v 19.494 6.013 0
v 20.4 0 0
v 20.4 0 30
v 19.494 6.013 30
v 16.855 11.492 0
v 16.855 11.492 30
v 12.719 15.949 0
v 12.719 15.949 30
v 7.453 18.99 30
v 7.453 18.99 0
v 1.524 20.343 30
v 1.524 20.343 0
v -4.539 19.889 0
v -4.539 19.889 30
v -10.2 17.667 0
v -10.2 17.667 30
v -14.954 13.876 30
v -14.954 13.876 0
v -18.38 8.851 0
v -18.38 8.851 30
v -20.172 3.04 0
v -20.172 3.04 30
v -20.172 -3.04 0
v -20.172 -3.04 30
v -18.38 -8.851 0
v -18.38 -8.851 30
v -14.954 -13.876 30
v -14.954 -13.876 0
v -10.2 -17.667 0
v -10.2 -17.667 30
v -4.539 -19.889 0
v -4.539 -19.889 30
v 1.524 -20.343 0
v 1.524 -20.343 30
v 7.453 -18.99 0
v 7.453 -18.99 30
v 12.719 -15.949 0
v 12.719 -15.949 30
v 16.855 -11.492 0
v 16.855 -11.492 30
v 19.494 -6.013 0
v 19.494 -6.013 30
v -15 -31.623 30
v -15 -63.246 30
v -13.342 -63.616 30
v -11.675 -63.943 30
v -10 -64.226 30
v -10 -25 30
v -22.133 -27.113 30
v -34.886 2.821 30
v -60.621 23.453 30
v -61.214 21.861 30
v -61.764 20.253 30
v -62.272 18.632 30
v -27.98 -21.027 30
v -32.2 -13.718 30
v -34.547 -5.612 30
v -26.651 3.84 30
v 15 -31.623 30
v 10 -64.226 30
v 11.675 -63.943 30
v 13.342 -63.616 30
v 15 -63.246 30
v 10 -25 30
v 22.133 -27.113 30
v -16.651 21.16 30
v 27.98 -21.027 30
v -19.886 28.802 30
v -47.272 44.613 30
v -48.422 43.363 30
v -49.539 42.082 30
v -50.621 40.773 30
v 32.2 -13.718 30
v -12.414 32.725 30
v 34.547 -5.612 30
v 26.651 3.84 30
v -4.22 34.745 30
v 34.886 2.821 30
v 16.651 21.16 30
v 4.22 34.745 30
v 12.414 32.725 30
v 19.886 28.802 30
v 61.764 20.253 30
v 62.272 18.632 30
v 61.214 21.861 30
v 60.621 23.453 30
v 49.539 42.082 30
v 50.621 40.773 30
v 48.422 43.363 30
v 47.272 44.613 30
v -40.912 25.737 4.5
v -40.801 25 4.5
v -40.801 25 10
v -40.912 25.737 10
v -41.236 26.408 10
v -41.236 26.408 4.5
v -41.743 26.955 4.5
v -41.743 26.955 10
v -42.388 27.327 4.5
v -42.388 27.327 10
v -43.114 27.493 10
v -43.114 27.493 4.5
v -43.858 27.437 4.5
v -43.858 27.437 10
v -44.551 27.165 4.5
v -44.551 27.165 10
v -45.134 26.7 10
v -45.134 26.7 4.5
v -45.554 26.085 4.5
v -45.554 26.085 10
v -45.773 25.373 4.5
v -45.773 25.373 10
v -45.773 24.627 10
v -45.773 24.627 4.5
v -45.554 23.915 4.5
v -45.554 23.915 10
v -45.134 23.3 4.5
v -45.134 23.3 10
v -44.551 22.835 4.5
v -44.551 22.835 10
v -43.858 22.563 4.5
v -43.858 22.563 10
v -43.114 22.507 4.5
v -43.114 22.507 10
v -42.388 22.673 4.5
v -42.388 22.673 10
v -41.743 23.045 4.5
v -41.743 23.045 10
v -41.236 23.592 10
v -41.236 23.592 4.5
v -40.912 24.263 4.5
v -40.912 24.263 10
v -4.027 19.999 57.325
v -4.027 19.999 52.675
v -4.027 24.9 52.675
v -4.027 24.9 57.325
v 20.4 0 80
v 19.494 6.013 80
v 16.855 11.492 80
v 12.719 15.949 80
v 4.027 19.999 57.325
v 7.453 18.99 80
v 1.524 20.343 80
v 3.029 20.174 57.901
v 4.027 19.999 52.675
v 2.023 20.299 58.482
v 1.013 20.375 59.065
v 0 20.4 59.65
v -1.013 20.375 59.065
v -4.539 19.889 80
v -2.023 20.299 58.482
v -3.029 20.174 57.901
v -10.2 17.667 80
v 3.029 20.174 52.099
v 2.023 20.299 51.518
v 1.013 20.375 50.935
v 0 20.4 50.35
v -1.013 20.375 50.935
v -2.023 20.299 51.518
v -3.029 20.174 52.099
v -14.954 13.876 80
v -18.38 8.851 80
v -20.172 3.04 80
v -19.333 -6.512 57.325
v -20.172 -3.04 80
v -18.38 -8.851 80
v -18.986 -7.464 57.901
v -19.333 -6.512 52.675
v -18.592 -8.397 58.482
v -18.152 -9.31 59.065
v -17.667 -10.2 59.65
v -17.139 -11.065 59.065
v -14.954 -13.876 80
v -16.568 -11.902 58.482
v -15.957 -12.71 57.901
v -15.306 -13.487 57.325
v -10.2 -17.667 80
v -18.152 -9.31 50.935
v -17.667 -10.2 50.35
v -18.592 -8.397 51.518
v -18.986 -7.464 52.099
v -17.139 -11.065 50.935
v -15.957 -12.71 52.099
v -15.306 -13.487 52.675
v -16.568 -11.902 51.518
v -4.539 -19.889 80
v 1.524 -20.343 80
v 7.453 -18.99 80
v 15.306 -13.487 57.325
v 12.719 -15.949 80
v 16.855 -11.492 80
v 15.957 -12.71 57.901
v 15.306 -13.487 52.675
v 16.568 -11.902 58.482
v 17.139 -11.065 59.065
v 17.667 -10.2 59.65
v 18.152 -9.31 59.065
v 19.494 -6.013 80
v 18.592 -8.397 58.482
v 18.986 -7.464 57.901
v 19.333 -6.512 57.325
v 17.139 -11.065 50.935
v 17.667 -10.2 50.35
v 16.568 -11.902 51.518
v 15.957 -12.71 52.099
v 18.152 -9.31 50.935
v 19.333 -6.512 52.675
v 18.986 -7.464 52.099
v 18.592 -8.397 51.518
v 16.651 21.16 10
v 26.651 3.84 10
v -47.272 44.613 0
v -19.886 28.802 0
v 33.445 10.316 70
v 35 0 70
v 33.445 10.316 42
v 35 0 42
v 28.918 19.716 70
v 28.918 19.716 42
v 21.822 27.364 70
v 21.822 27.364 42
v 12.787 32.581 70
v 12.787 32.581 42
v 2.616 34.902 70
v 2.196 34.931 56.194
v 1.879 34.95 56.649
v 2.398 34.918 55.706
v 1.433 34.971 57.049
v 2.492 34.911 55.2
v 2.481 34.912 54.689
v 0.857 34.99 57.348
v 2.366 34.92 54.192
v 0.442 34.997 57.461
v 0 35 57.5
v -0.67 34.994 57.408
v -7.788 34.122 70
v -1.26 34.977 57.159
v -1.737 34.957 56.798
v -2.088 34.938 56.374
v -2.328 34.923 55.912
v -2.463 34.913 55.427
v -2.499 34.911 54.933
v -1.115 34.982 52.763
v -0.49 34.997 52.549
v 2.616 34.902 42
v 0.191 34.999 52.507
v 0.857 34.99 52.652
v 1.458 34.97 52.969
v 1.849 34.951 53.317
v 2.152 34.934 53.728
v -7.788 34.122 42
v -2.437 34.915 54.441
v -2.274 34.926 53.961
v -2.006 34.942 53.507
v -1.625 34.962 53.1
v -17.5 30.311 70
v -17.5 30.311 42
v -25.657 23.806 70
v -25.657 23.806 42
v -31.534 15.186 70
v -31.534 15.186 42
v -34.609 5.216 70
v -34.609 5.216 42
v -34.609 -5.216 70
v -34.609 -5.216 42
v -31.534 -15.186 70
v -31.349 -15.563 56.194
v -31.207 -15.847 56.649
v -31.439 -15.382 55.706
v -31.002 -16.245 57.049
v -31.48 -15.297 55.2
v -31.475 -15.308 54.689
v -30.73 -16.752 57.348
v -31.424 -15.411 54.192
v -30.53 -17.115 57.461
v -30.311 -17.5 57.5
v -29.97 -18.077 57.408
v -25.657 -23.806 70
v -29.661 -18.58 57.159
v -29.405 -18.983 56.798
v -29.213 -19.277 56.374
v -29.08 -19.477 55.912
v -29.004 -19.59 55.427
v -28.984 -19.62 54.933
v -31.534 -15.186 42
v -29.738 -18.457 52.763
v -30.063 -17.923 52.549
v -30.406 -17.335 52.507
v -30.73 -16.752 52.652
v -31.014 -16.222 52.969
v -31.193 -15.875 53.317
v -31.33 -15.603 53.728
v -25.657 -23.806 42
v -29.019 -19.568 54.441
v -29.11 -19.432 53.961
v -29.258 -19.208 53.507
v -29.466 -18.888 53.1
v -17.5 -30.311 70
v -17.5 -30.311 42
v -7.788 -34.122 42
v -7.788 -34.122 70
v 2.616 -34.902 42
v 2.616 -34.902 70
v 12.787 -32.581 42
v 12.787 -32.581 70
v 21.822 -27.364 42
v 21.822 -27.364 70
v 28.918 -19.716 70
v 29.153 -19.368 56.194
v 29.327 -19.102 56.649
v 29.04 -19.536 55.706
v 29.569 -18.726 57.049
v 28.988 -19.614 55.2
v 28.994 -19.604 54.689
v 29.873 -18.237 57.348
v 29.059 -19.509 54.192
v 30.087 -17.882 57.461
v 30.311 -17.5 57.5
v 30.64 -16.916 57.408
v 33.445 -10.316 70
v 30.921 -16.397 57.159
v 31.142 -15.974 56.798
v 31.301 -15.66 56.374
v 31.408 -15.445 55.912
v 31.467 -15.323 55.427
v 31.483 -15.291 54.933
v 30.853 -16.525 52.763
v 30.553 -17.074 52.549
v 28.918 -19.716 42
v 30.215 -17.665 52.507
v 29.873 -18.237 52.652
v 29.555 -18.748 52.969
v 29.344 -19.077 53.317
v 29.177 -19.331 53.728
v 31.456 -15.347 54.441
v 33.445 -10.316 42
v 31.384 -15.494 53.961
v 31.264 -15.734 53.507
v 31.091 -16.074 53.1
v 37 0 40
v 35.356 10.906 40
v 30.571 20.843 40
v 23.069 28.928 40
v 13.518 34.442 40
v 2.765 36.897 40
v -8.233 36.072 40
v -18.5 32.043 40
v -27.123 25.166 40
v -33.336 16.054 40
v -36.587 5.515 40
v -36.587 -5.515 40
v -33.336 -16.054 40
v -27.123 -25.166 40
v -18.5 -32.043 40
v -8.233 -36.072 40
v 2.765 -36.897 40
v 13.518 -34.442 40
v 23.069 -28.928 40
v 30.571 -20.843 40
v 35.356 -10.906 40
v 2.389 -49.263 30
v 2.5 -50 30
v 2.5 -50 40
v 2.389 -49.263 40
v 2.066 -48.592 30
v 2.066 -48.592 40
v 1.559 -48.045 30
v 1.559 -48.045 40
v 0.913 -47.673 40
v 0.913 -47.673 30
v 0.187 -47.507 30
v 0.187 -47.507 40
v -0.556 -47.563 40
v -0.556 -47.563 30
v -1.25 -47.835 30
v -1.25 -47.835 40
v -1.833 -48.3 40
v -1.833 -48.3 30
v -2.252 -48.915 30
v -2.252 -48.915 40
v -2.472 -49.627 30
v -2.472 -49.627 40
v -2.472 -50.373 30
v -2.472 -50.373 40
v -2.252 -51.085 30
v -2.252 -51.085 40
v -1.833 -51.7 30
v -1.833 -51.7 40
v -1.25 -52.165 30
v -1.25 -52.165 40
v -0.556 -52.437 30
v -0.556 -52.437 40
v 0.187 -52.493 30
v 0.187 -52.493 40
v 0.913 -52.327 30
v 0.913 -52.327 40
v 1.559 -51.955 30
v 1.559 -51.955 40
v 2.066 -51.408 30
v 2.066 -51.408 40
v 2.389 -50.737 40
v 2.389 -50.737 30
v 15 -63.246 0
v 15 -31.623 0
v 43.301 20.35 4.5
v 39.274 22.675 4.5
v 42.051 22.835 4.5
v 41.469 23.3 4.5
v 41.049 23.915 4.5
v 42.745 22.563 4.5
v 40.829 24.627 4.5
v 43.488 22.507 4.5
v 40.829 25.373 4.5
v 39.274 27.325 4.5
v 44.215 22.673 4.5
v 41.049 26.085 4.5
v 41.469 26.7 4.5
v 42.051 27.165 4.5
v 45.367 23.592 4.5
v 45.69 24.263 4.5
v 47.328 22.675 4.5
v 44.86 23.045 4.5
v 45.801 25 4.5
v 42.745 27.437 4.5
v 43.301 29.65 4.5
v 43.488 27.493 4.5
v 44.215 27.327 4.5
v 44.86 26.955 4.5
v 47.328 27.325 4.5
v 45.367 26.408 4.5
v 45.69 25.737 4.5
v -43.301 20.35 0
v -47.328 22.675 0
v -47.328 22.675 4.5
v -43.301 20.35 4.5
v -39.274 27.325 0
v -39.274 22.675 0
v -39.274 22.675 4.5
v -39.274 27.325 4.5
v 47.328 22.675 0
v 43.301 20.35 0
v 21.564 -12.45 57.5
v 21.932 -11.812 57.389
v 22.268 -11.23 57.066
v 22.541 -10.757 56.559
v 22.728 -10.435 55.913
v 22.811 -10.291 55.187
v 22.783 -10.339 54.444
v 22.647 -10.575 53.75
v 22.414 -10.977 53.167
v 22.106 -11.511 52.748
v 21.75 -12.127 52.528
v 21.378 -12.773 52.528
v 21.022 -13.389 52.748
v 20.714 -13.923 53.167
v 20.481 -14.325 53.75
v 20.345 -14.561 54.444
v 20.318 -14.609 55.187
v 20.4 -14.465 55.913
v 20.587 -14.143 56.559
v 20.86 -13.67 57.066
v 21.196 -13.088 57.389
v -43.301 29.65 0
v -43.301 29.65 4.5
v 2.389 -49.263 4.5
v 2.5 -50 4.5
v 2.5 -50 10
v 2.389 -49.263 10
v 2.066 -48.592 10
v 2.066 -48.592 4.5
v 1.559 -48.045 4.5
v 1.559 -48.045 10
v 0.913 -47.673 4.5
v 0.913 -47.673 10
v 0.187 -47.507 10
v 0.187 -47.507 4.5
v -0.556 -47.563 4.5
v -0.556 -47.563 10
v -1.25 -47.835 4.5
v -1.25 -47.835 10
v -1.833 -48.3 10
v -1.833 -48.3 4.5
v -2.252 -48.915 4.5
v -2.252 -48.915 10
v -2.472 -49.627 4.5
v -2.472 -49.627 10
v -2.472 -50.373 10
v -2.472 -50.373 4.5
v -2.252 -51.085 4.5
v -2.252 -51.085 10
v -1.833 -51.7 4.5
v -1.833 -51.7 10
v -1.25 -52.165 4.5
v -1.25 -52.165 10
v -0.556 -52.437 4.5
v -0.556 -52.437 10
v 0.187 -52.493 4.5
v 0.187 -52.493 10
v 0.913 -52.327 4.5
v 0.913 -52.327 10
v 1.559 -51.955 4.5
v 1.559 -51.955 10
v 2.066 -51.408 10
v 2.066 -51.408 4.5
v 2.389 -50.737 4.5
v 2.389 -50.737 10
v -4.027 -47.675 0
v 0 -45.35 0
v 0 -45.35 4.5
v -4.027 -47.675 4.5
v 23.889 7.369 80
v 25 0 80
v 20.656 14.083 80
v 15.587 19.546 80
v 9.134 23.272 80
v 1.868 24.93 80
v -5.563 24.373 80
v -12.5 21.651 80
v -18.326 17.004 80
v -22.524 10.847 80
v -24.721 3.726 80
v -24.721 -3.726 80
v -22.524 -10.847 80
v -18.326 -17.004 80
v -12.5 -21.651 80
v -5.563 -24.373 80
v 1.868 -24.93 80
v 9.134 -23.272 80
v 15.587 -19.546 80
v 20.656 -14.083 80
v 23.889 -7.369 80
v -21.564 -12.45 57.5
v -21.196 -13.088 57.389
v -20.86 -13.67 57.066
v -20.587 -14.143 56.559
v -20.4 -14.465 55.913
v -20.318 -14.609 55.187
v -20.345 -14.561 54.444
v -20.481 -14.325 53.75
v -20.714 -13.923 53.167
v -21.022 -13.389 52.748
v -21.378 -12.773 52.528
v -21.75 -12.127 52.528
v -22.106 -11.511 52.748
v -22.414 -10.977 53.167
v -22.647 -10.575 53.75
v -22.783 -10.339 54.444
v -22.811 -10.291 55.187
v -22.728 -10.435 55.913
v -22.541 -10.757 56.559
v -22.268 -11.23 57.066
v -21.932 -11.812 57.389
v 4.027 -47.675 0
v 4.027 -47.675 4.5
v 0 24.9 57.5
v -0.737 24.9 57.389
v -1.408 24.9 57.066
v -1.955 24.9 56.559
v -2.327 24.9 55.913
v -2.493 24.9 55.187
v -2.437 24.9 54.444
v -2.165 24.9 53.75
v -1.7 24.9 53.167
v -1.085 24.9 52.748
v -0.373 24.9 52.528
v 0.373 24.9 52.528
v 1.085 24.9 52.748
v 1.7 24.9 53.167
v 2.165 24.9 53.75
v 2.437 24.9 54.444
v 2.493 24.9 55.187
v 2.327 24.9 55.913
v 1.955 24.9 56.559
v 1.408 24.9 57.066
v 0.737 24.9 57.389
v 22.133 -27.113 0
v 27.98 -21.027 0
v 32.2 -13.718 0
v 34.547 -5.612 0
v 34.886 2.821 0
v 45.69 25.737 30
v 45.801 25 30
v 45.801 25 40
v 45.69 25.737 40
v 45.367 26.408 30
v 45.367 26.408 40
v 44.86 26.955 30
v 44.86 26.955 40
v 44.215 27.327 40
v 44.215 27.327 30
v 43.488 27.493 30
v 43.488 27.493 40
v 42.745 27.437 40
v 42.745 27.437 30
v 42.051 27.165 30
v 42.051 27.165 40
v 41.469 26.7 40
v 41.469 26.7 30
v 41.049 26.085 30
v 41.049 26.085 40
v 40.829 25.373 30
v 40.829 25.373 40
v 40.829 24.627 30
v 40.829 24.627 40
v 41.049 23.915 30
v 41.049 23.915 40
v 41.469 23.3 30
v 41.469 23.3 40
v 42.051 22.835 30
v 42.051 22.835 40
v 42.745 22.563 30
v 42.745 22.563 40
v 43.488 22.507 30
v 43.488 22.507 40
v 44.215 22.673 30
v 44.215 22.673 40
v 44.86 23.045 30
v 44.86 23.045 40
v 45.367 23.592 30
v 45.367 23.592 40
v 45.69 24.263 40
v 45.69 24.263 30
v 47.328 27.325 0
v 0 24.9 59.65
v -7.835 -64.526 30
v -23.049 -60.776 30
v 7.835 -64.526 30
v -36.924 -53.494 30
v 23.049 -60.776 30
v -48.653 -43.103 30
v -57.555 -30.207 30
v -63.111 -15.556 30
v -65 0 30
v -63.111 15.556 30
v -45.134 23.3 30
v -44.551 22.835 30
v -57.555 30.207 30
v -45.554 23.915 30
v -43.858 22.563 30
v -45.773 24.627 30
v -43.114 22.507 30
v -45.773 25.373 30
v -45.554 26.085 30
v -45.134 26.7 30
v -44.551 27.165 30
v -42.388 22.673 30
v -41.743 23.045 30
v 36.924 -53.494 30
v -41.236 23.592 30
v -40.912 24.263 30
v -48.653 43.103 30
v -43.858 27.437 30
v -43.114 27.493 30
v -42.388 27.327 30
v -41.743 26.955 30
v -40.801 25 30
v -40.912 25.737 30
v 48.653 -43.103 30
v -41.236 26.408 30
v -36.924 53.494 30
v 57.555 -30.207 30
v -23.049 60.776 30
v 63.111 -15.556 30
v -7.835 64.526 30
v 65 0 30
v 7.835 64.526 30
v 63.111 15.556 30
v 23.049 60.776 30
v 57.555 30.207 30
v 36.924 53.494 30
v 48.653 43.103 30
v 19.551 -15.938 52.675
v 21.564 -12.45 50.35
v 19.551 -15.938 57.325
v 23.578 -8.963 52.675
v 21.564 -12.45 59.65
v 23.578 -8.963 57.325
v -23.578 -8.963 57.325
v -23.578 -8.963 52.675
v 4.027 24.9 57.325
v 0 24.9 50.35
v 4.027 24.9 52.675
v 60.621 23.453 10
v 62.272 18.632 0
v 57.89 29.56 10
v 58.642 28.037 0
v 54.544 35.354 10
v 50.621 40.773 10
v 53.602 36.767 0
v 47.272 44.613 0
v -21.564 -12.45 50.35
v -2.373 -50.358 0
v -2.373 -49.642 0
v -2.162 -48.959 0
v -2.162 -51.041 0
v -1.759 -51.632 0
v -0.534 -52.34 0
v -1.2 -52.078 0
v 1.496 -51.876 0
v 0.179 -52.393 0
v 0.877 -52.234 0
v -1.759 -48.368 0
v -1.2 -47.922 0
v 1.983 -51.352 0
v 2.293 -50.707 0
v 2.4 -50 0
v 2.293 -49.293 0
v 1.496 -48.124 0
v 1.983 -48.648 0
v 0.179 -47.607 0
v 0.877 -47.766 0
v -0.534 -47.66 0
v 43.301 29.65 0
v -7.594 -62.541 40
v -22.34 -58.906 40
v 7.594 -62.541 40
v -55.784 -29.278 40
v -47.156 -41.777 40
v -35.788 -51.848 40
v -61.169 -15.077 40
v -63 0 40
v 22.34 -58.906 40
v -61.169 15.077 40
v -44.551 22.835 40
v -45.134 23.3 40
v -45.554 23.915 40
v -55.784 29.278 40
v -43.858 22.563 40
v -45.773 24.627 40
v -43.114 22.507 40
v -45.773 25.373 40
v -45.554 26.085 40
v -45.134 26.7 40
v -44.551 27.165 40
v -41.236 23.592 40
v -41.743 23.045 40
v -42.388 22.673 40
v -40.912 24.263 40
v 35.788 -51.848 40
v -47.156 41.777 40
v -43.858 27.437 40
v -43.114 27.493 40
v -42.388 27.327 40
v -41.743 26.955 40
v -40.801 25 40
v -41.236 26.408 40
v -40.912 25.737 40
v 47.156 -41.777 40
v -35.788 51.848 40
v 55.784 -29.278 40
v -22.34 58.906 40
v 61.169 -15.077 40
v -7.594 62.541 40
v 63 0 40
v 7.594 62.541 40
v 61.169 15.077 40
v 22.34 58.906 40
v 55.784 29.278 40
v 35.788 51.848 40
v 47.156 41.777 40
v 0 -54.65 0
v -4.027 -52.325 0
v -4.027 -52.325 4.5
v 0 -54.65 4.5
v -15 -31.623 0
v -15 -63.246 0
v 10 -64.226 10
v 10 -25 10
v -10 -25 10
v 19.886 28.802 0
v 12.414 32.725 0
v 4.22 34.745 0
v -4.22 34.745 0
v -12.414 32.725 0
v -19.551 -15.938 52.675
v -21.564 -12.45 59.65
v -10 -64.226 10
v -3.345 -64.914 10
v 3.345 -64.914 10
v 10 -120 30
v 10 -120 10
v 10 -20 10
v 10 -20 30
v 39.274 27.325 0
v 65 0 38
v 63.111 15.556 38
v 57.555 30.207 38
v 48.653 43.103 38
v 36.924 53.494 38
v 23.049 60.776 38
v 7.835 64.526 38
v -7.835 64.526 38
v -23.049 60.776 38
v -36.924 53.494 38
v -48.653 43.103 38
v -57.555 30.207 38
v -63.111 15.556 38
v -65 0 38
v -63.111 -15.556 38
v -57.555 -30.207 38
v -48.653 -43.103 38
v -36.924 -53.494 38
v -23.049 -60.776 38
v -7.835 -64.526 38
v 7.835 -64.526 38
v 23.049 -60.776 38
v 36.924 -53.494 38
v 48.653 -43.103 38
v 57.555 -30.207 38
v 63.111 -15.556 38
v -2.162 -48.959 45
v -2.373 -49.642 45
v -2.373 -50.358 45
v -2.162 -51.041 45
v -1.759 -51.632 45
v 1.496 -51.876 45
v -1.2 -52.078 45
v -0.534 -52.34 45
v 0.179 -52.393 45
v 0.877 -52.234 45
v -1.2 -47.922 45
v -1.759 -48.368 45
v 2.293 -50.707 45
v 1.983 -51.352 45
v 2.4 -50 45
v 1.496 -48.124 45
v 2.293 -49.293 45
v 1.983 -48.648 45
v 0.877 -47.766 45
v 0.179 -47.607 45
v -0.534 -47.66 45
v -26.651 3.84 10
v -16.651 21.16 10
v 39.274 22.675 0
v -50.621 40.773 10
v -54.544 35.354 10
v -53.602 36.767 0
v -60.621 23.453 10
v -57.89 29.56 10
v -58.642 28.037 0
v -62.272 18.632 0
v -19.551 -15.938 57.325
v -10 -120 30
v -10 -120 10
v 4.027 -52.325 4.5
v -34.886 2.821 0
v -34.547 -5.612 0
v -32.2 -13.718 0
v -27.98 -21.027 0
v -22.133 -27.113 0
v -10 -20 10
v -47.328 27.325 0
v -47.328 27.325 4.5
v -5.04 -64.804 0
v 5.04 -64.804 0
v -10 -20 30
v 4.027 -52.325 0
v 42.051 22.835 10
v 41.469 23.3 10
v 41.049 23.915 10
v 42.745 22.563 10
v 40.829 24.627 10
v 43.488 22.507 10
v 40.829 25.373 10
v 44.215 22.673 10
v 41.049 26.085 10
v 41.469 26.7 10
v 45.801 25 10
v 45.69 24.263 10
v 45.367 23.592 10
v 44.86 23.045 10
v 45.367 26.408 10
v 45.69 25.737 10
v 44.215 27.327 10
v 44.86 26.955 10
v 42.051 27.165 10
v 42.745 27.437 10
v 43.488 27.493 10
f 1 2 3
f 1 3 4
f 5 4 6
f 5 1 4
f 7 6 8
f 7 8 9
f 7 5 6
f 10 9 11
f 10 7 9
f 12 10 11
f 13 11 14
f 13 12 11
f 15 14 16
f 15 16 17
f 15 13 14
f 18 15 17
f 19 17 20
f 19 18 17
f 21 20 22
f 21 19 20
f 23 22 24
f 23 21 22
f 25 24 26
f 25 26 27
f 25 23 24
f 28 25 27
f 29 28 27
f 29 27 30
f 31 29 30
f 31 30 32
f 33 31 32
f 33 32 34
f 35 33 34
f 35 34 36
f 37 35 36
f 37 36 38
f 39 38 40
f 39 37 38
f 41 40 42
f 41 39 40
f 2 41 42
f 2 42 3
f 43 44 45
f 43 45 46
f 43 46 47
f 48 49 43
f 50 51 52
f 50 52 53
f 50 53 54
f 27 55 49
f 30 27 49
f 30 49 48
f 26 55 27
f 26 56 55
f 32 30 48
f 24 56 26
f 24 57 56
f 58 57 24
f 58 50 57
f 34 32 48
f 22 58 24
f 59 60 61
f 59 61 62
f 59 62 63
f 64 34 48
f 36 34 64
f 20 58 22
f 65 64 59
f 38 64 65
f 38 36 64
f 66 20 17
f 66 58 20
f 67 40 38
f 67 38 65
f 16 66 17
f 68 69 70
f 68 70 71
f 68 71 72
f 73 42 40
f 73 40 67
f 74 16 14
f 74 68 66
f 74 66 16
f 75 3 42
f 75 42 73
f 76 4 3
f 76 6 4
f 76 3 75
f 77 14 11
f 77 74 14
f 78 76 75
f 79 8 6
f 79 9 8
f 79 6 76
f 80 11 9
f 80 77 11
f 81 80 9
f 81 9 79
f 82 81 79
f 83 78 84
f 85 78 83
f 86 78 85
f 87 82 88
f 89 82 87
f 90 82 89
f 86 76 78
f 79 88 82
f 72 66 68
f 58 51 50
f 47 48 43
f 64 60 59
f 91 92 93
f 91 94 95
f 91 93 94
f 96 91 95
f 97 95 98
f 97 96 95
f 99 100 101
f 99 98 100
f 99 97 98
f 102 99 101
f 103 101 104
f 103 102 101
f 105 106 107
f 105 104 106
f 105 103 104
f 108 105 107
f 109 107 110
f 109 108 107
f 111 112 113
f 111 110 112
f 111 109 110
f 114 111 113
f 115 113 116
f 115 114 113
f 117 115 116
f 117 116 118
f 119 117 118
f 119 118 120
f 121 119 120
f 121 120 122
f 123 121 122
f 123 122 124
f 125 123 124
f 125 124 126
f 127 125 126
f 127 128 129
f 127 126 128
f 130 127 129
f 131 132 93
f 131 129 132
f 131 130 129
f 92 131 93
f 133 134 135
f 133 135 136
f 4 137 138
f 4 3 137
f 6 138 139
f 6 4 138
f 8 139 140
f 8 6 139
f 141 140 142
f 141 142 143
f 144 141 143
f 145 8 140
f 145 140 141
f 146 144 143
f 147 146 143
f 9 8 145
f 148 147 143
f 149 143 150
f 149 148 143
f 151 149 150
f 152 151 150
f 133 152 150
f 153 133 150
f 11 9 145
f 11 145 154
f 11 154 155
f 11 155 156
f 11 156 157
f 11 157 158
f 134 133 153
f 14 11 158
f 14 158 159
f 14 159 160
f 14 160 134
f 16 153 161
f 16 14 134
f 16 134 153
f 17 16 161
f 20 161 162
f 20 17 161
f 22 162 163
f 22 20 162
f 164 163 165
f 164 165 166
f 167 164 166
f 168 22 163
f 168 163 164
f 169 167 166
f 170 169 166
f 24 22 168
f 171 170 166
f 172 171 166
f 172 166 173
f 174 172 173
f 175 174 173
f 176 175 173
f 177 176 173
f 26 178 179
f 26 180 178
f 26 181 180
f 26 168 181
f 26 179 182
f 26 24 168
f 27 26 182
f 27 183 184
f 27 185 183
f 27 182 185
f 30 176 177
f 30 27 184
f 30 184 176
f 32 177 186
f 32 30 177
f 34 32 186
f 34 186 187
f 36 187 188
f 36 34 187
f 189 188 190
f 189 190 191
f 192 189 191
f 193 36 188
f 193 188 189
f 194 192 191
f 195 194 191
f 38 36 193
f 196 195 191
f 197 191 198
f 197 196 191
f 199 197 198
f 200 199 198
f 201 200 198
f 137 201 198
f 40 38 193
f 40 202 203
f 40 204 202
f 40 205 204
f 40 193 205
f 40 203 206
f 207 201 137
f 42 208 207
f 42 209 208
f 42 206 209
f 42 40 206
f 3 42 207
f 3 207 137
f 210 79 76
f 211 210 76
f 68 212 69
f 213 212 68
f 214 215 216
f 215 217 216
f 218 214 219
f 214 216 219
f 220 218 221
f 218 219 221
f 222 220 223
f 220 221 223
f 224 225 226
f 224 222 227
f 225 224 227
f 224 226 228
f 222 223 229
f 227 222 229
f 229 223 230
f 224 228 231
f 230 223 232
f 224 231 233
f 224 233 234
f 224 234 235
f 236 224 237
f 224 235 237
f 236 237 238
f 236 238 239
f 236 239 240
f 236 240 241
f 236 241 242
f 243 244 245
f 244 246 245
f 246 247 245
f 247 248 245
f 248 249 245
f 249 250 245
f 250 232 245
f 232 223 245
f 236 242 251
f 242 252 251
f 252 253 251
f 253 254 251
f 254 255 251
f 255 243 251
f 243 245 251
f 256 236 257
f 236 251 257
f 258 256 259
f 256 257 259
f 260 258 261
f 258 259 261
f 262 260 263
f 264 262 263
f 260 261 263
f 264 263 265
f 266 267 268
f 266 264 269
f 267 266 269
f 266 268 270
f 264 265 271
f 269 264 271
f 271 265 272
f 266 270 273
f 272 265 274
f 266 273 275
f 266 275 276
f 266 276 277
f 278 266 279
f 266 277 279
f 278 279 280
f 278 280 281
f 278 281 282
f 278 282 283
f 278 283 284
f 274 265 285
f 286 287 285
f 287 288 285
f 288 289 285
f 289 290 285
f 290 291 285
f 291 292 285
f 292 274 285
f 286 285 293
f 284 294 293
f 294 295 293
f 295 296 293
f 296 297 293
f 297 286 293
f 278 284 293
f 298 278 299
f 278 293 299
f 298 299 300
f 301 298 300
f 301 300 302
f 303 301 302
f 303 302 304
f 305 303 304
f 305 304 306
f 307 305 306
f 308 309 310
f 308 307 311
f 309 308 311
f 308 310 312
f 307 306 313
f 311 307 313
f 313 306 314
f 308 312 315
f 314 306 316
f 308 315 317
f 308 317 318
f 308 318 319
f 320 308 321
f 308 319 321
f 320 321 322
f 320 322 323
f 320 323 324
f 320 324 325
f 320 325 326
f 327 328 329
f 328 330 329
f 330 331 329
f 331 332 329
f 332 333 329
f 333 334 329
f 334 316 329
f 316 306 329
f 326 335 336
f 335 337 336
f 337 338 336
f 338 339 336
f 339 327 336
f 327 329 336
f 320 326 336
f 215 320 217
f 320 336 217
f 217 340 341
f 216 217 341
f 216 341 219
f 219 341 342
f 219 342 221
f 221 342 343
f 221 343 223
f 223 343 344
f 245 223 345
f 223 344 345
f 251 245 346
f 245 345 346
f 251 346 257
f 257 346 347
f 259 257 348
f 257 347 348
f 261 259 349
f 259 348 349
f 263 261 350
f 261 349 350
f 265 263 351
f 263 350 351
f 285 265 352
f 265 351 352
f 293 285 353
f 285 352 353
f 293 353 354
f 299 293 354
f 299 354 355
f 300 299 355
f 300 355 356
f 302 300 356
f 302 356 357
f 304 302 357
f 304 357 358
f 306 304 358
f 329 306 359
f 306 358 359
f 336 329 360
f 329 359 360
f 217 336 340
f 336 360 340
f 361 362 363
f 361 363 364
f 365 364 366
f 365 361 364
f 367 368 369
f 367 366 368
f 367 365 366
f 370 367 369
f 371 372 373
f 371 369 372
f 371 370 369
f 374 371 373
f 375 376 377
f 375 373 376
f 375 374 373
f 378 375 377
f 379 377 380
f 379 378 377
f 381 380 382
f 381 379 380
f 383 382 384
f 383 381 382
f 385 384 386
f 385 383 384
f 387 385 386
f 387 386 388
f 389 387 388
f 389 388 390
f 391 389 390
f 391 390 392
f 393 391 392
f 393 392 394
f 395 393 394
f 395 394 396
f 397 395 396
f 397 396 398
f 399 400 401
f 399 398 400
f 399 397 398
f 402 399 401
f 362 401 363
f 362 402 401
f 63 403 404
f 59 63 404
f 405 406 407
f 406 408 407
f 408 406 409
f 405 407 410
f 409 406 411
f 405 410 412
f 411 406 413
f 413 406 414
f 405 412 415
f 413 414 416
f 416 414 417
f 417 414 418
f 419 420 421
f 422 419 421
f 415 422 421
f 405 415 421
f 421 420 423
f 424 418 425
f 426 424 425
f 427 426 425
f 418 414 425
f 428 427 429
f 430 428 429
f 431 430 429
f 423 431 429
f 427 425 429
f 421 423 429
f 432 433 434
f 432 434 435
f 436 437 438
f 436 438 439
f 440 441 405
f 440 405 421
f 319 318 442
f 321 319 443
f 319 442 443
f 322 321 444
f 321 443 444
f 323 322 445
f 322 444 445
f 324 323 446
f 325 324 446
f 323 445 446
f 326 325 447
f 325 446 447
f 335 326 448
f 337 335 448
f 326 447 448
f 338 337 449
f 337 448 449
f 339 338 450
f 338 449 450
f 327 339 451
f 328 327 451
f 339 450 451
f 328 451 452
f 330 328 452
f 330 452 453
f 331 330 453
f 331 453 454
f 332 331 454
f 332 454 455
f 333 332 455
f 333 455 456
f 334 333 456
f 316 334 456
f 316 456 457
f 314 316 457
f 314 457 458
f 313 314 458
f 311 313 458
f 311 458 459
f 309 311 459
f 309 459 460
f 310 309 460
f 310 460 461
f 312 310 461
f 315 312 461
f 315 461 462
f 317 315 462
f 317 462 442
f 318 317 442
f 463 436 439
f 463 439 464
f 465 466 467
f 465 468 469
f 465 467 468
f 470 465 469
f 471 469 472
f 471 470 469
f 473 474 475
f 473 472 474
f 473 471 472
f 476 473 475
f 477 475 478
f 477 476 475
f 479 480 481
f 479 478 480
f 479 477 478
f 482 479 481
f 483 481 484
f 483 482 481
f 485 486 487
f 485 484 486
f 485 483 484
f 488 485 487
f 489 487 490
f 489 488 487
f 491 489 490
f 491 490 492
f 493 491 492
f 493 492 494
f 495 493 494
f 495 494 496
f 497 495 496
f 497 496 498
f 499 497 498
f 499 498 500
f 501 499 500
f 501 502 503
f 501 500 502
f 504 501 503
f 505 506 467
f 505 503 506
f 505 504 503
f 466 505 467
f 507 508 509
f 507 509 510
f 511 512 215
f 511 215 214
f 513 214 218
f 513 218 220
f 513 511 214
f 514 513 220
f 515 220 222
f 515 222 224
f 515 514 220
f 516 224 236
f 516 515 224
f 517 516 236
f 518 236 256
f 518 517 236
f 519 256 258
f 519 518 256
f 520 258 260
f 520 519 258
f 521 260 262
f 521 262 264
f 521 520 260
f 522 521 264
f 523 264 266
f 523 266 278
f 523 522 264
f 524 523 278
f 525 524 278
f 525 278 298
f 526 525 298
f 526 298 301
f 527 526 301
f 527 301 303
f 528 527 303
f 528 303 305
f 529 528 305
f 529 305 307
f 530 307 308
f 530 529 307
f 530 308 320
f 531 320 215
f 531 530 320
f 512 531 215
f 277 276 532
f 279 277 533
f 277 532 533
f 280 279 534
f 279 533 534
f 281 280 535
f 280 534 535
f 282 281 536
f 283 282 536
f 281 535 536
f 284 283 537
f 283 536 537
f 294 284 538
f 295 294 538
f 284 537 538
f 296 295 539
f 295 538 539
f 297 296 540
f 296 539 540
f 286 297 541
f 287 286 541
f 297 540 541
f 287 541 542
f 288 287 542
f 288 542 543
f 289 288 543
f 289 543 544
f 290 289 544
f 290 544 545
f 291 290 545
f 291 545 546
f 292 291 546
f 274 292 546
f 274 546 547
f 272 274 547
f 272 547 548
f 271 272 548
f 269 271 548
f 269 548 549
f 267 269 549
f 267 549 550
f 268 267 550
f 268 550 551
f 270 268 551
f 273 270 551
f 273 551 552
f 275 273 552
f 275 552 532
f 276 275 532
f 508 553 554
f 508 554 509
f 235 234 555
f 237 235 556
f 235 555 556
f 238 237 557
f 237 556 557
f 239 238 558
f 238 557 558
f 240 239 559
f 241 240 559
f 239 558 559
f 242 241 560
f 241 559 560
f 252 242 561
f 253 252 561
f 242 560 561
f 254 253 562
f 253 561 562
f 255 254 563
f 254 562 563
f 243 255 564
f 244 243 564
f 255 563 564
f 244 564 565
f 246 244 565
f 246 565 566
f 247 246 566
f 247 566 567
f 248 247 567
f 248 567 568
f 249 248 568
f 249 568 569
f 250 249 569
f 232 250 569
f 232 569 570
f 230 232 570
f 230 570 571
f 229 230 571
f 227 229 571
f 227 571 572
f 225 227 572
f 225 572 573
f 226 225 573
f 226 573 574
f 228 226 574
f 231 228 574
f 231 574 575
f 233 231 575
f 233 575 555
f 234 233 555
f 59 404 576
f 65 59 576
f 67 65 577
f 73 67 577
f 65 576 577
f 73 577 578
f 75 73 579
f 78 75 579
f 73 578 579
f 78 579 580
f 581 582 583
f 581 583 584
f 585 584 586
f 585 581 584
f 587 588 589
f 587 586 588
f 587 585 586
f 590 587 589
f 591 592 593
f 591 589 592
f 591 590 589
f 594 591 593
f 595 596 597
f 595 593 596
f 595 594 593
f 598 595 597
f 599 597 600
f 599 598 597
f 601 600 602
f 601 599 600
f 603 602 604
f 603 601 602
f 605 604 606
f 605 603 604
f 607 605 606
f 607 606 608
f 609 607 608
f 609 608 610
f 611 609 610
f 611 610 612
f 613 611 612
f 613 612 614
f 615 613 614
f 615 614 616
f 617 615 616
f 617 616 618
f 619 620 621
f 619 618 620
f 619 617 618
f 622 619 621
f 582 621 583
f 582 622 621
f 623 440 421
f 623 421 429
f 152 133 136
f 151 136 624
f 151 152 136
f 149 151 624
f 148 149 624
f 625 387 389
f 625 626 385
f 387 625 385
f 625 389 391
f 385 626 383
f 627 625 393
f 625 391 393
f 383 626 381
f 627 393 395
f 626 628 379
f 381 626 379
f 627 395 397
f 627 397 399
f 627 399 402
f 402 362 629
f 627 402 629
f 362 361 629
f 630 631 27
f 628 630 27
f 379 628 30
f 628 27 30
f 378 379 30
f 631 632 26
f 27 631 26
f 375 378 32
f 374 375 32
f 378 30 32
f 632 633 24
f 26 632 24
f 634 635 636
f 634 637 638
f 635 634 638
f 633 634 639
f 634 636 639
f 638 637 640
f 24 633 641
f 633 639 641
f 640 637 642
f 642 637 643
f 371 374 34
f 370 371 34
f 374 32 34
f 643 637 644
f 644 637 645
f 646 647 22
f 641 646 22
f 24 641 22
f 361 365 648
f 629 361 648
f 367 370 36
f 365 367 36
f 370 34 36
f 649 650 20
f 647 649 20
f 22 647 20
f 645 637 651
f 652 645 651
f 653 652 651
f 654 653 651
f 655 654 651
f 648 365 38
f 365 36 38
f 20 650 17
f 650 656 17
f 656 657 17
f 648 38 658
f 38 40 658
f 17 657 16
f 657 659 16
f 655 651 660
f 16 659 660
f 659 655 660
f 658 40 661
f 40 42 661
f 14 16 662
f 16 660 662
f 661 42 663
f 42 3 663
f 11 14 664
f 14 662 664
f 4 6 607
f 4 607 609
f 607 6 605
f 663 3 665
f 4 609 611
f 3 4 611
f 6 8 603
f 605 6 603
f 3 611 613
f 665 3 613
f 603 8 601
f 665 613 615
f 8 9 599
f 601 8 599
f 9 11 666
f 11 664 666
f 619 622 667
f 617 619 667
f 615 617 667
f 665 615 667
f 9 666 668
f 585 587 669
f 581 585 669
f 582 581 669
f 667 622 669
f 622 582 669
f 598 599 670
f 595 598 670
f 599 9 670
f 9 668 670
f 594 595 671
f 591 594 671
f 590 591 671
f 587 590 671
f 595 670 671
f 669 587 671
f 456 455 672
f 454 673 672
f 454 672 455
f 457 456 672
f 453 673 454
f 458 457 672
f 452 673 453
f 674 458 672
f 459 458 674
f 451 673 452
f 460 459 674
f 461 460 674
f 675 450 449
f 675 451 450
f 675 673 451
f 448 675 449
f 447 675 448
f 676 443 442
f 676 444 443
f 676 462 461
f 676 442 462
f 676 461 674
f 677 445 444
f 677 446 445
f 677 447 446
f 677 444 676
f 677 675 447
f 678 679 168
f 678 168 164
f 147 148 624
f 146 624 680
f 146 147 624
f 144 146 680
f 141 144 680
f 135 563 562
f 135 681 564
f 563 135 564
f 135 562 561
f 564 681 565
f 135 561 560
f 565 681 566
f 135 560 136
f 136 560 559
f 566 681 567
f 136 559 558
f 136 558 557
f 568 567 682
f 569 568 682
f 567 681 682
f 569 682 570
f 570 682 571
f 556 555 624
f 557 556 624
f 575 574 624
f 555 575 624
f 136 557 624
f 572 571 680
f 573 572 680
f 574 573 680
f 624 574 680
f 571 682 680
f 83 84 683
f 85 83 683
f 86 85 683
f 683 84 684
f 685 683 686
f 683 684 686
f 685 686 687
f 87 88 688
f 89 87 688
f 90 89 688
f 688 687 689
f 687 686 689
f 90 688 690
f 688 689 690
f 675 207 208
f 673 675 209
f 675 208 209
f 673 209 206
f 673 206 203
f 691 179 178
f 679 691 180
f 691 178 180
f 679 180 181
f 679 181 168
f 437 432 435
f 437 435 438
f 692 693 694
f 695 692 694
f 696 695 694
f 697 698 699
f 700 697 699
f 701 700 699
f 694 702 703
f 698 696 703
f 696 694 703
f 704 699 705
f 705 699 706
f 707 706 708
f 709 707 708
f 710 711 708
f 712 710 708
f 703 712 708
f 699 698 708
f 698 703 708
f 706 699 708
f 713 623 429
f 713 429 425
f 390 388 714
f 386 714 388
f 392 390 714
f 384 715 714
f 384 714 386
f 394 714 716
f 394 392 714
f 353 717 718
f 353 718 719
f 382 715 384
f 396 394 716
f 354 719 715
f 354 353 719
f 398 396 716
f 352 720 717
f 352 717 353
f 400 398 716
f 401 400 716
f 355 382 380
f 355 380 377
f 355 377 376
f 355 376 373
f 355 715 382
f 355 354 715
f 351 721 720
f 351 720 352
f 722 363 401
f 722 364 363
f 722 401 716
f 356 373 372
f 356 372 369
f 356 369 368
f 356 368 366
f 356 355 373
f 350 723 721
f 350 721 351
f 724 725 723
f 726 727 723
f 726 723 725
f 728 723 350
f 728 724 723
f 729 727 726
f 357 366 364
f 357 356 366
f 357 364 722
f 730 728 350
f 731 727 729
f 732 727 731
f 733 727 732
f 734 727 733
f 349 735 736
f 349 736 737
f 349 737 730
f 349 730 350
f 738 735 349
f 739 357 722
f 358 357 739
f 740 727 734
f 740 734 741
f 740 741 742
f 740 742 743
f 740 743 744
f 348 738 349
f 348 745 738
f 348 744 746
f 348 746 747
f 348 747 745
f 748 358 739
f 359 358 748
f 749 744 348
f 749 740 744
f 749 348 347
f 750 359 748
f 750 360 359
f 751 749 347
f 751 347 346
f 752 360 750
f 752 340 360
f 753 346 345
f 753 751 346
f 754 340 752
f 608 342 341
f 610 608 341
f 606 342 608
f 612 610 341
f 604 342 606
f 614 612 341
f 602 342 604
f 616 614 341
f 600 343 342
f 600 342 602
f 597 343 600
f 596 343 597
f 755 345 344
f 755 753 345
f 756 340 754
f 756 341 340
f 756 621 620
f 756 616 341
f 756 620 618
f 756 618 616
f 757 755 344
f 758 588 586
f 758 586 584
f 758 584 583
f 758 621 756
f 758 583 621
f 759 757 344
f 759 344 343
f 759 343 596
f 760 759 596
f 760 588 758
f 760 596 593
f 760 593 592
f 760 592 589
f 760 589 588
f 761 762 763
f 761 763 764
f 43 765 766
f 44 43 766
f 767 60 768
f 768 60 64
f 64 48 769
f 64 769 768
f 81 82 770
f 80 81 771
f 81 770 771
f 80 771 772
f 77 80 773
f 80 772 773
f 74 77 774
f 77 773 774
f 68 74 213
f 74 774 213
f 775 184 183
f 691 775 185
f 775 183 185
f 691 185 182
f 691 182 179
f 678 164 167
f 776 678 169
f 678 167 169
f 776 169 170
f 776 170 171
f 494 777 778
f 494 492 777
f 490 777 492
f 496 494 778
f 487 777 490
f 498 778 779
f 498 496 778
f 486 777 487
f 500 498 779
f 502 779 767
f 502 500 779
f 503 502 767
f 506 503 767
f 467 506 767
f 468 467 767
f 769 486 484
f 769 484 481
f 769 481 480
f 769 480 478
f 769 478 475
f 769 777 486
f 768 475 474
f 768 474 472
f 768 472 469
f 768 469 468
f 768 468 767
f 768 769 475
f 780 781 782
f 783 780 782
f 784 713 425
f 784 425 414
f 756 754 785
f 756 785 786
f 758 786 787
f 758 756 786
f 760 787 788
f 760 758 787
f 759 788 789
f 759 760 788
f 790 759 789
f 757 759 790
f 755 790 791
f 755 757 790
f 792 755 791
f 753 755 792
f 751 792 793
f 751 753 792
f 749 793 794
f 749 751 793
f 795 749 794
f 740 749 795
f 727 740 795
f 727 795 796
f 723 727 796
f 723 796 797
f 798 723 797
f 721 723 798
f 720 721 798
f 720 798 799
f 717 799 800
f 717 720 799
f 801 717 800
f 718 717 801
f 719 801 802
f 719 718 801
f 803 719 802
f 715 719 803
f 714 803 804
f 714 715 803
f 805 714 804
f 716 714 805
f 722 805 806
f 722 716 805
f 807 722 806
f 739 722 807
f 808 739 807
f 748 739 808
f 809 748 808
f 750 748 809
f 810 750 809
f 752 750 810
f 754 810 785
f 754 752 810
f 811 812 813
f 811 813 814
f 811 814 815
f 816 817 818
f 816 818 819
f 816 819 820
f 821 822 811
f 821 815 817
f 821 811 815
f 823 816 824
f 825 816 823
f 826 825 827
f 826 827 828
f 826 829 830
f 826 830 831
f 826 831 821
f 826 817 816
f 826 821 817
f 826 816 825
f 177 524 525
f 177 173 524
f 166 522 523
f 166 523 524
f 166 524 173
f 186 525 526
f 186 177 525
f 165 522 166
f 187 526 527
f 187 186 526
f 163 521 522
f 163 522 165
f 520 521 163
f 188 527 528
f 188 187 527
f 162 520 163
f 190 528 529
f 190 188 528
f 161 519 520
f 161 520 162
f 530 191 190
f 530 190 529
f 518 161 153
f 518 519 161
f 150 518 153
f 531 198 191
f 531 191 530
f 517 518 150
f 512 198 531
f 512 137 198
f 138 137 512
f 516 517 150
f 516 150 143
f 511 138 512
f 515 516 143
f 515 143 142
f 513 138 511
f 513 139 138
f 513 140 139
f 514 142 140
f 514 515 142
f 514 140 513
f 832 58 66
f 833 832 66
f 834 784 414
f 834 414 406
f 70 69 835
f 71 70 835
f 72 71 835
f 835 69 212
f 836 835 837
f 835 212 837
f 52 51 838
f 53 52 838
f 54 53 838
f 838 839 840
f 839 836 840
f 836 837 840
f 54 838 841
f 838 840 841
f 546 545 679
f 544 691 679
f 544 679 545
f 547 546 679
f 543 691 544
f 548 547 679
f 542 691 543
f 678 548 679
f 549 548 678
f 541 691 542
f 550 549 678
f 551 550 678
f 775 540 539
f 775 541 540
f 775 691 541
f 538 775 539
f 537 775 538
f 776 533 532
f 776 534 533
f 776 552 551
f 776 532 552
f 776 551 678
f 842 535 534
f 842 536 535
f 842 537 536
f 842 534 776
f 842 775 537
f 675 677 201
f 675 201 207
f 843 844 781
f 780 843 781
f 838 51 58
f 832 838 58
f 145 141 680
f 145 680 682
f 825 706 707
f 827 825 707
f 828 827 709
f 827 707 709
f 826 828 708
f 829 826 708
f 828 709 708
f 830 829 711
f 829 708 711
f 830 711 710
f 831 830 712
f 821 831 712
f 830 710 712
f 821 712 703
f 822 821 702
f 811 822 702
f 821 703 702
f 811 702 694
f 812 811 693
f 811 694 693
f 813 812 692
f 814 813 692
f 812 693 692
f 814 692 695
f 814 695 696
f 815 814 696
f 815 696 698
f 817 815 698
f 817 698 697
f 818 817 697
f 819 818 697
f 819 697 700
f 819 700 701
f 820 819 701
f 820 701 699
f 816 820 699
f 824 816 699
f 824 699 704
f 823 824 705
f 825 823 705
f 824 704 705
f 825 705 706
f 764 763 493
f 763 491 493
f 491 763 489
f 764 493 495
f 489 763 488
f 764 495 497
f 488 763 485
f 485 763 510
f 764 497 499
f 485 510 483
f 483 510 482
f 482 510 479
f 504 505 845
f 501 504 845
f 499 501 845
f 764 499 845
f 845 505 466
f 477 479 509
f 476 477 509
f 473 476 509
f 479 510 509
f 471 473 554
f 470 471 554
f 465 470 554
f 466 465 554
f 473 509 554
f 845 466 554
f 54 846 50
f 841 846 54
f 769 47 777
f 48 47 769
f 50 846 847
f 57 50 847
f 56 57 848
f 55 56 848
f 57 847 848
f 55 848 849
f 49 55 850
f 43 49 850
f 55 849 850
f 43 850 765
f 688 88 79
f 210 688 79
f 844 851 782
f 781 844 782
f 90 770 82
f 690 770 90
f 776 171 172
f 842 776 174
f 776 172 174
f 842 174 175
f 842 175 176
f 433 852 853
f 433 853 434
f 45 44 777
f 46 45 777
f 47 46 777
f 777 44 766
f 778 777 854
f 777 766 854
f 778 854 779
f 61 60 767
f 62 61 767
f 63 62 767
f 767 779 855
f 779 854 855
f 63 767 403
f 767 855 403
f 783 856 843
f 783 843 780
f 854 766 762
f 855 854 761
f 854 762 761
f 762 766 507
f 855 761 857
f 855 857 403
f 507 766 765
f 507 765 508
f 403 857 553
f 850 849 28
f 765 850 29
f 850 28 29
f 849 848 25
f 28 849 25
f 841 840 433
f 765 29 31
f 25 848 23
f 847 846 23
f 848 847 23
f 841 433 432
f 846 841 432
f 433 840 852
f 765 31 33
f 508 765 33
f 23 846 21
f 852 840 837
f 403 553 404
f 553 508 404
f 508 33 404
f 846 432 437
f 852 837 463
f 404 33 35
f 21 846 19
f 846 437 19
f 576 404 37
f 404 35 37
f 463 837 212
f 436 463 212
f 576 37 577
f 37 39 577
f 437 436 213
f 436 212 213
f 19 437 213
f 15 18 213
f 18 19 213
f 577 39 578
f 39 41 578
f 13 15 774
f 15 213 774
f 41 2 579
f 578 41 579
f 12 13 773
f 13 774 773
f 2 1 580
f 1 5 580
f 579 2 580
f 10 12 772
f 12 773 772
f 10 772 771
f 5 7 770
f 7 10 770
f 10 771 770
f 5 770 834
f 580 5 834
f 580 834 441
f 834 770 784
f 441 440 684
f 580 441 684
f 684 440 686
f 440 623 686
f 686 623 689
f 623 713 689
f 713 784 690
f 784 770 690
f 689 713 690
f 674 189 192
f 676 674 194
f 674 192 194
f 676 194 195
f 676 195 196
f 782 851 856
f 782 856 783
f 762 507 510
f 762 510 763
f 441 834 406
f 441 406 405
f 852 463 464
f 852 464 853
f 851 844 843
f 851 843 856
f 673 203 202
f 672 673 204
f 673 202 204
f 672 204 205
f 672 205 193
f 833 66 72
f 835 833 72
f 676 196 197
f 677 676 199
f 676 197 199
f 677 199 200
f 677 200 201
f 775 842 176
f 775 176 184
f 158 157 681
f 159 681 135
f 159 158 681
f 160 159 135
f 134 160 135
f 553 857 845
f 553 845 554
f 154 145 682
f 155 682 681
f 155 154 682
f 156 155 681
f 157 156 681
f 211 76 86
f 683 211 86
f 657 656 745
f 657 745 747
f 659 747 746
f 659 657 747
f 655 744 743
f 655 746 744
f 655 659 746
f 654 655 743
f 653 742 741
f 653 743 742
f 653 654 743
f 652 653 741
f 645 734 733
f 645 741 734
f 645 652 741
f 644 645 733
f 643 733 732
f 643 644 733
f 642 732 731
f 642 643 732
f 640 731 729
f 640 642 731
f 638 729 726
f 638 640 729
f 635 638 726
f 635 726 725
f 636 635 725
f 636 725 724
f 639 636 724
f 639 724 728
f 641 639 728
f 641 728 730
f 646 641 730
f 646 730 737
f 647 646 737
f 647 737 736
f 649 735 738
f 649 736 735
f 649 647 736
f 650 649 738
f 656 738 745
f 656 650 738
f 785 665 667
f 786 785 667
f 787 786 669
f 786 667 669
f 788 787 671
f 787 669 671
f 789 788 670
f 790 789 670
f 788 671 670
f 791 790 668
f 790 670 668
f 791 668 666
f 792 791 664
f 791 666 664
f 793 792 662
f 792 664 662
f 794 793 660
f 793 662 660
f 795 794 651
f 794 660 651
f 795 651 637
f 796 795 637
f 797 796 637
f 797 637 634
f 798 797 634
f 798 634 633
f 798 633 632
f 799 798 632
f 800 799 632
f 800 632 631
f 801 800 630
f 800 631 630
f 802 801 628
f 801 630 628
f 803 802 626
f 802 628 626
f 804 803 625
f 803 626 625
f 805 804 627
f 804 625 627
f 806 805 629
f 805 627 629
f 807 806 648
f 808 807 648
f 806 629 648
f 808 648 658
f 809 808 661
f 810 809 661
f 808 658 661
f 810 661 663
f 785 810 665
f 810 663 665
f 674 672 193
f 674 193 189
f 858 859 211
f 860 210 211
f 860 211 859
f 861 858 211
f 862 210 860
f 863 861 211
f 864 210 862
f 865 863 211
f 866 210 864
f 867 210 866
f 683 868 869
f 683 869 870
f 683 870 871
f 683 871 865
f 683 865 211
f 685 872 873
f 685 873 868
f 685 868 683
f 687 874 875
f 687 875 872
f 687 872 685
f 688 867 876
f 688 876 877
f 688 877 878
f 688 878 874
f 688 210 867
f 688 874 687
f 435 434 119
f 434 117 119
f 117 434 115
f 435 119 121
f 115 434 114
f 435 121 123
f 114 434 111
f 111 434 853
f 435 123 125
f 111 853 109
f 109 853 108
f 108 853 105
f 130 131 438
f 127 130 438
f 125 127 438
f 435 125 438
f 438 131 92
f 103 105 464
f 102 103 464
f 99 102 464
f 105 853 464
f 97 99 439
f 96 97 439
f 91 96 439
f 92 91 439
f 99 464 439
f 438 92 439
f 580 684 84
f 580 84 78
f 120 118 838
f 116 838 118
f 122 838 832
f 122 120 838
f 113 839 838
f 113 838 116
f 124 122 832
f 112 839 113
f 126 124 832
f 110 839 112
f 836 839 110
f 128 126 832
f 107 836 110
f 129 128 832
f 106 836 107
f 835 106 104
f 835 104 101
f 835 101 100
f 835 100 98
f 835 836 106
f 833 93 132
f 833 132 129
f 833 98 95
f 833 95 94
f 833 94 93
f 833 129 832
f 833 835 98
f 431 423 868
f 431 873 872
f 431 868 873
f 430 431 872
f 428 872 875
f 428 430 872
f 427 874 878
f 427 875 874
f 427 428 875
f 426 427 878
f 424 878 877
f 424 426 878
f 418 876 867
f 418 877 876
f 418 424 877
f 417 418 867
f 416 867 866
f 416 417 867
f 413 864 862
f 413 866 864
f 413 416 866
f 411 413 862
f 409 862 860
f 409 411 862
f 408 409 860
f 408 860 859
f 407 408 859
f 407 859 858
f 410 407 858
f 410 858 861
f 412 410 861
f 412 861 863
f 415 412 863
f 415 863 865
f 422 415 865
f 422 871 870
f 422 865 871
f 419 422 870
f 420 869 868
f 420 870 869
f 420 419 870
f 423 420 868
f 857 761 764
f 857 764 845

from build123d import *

# Parameters (mm, degrees)
SKETCH_R        = 20.4
PAD_DEPTH       = 30
SKETCH012_W     = 20
SKETCH012_H     = 45
POCKET010_DEPTH = 20
SKETCH010_R     = 2.5
POCKET008_DEPTH = 30.001
POCKET009_DEPTH = 4.5
SKETCH004_R     = 65
SKETCH004_R_2   = 20.4
PAD001_DEPTH    = 10
SKETCH002_R     = 35
SKETCH002_R_2   = 20.4
PAD002_DEPTH    = 40
CHAMFER_SIZE    = 2
CHAMFER001_SIZE = 10
COPYSKETCH006_R = 2.5
POCKET001_DEPTH = 88.792651
COPYSKETCH007_R = 2.5
POCKET002_DEPTH = 88.792651
COPYSKETCH008_R = 2.5
POCKET003_DEPTH = 65.001
POCKET004_DEPTH = 24.9
POCKET005_DEPTH = 24.9
POCKET006_DEPTH = 24.9
SKETCH009_R     = 2.5
POCKET007_DEPTH = 80.001
BOX_W           = 20
BOX_H           = 100
BOX_DEPTH       = 20
CYLINDER_R      = 2.4
CYLINDER_DEPTH  = 45


with BuildPart() as bottombody:
    # Sketch → Pad (new body)
    with BuildSketch(Plane.XY):
        with BuildLine():
            ThreePointArc((15, -31.622777), (30.310889, -17.5), (34.886128, 2.821007))
            Line((62.272256, 18.632396), (34.886128, 2.821007))
            ThreePointArc((62.272256, 18.632396), (56.291651, 32.5), (47.272256, 44.613158))
            Line((19.886128, 28.801769), (47.272256, 44.613158))
            ThreePointArc((19.886128, 28.801769), (0, 35), (-19.886128, 28.801769))
            Line((-47.272256, 44.613158), (-19.886128, 28.801769))
            ThreePointArc((-47.272256, 44.613158), (-56.291651, 32.5), (-62.272256, 18.632396))
            Line((-34.886128, 2.821007), (-62.272256, 18.632396))
            ThreePointArc((-34.886128, 2.821007), (-30.310889, -17.5), (-15, -31.622777))
            Line((-15, -31.622777), (-15, -63.245553))
            ThreePointArc((-15, -63.245553), (0, -65), (15, -63.245553))
            Line((15, -63.245553), (15, -31.622777))
        make_face()
        Circle(SKETCH_R, mode=Mode.SUBTRACT)
    extrude(amount=PAD_DEPTH)

    # Sketch012 (on Face15 of Pad) → Pocket010 (cut)
    with BuildSketch(Plane.XY.offset(30)):
        with Locations((0, -47.5)):
            Rectangle(SKETCH012_W, SKETCH012_H)
        Polygon((26.650635, 3.839746), (65.621778, 26.339746), (55.621778, 43.660254), (16.650635, 21.160254), align=None)
        Polygon((-16.650635, 21.160254), (-55.621778, 43.660254), (-65.621778, 26.339746), (-26.650635, 3.839746), align=None)
    extrude(amount=-POCKET010_DEPTH, mode=Mode.SUBTRACT)

    # Sketch010 → Pocket008 (cut, through all)
    with BuildSketch(Plane.XY):
        with Locations((0, -50)):
            Circle(SKETCH010_R)
        with Locations((-43.30127, 25)):
            Circle(SKETCH010_R)
        with Locations((43.30127, 25)):
            Circle(SKETCH010_R)
    extrude(amount=POCKET008_DEPTH, mode=Mode.SUBTRACT)

    # Sketch011 → Pocket009 (cut)
    with BuildSketch(Plane.XY):
        Polygon((0, -45.35), (-4.027018, -47.675), (-4.027018, -52.325), (0, -54.65), (4.027018, -52.325), (4.027018, -47.675), align=None)
        Polygon((-39.274252, 22.675), (-39.274252, 27.325), (-43.30127, 29.65), (-47.328288, 27.325), (-47.328288, 22.675), (-43.30127, 20.35), align=None)
        Polygon((39.274252, 22.675), (43.30127, 20.35), (47.328288, 22.675), (47.328288, 27.325), (43.30127, 29.65), (39.274252, 27.325), align=None)
    extrude(amount=POCKET009_DEPTH, mode=Mode.SUBTRACT)


with BuildPart() as topbody:
    # Sketch004 → Pad001 (new body)
    with BuildSketch(Plane.XY.offset(30)):
        Circle(SKETCH004_R)
        Circle(SKETCH004_R_2, mode=Mode.SUBTRACT)
    extrude(amount=PAD001_DEPTH)

    # Sketch002 (on Face4 of Pad001) → Pad002 (join)
    with BuildSketch(Plane.XY.offset(40)):
        Circle(SKETCH002_R)
        Circle(SKETCH002_R_2, mode=Mode.SUBTRACT)
    extrude(amount=PAD002_DEPTH)

    # Chamfer
    chamfer_edges = [topbody.edges().sort_by_distance(p)[0] for p in [
        (-65, 0, 40),
        (-35, 0, 40),
    ]]
    chamfer(chamfer_edges, length=CHAMFER_SIZE)

    # Chamfer001
    chamfer001_edges = [topbody.edges().sort_by_distance(p)[0] for p in [
        (-35, 0, 80),
    ]]
    chamfer(chamfer001_edges, length=CHAMFER001_SIZE)

    # CopySketch006 (on Z_Axis) → Pocket001 (cut, through all)
    with BuildSketch(Plane(origin=(0, 0, 55), x_dir=(0, 0, 1), z_dir=(0.866025, 0.5, 0))):
        Circle(COPYSKETCH006_R)
    extrude(amount=-POCKET001_DEPTH, mode=Mode.SUBTRACT)

    # CopySketch007 (on Z_Axis) → Pocket002 (cut, through all)
    with BuildSketch(Plane(origin=(0, 0, 55), x_dir=(0, 0, 1), z_dir=(-0.866025, 0.5, 0))):
        Circle(COPYSKETCH007_R)
    extrude(amount=-POCKET002_DEPTH, mode=Mode.SUBTRACT)

    # CopySketch008 (on Z_Axis) → Pocket003 (cut, through all)
    with BuildSketch(Plane(origin=(0, 0, 55), x_dir=(0, 0, 1), z_dir=(0, -1, 0))):
        Circle(COPYSKETCH008_R)
    extrude(amount=-POCKET003_DEPTH, mode=Mode.SUBTRACT)

    # Sketch006 (on Z_Axis) → Pocket004 (cut)
    with BuildSketch(Plane(origin=(0, 0, 55), x_dir=(0, 0, 1), z_dir=(0, 1, 0))):
        Polygon((4.65, 0), (2.325, 4.027018), (-2.325, 4.027018), (-4.65, 0), (-2.325, -4.027018), (2.325, -4.027018), align=None)
    extrude(amount=POCKET004_DEPTH, mode=Mode.SUBTRACT)

    # Sketch007 (on Z_Axis) → Pocket005 (cut)
    with BuildSketch(Plane(origin=(0, 0, 55), x_dir=(0, 0, 1), z_dir=(-0.866025, 0.5, 0))):
        Polygon((4.65, 0), (2.325, 4.027018), (-2.325, 4.027018), (-4.65, 0), (-2.325, -4.027018), (2.325, -4.027018), align=None)
    extrude(amount=-POCKET005_DEPTH, mode=Mode.SUBTRACT)

    # Sketch008 (on Z_Axis) → Pocket006 (cut)
    with BuildSketch(Plane(origin=(0, 0, 55), x_dir=(0, 0, 1), z_dir=(0.866025, 0.5, 0))):
        Polygon((4.65, 0), (2.325, 4.027018), (-2.325, 4.027018), (-4.65, 0), (-2.325, -4.027018), (2.325, -4.027018), align=None)
    extrude(amount=-POCKET006_DEPTH, mode=Mode.SUBTRACT)

    # Sketch009 → Pocket007 (cut, through all)
    with BuildSketch(Plane.XY):
        with Locations((0, -50)):
            Circle(SKETCH009_R)
        with Locations((-43.30127, 25)):
            Circle(SKETCH009_R)
        with Locations((43.30127, 25)):
            Circle(SKETCH009_R)
    extrude(amount=POCKET007_DEPTH, mode=Mode.SUBTRACT)


with BuildPart() as profile:
    # Box → Box (new body)
    with BuildSketch(Plane(origin=(-10, -120, 10), x_dir=(1, 0, 0), z_dir=(0, 0, 1))):
        with Locations((10, 50)):
            Rectangle(BOX_W, BOX_H)
    extrude(amount=BOX_DEPTH)


with BuildPart() as skrew:
    # Cylinder → Cylinder (new body)
    with BuildSketch(Plane(origin=(0, -50, 0), x_dir=(1, 0, 0), z_dir=(0, 0, 1))):
        Circle(CYLINDER_R)
    extrude(amount=CYLINDER_DEPTH)


solid = Compound([bottombody.part, topbody.part, profile.part, skrew.part])
